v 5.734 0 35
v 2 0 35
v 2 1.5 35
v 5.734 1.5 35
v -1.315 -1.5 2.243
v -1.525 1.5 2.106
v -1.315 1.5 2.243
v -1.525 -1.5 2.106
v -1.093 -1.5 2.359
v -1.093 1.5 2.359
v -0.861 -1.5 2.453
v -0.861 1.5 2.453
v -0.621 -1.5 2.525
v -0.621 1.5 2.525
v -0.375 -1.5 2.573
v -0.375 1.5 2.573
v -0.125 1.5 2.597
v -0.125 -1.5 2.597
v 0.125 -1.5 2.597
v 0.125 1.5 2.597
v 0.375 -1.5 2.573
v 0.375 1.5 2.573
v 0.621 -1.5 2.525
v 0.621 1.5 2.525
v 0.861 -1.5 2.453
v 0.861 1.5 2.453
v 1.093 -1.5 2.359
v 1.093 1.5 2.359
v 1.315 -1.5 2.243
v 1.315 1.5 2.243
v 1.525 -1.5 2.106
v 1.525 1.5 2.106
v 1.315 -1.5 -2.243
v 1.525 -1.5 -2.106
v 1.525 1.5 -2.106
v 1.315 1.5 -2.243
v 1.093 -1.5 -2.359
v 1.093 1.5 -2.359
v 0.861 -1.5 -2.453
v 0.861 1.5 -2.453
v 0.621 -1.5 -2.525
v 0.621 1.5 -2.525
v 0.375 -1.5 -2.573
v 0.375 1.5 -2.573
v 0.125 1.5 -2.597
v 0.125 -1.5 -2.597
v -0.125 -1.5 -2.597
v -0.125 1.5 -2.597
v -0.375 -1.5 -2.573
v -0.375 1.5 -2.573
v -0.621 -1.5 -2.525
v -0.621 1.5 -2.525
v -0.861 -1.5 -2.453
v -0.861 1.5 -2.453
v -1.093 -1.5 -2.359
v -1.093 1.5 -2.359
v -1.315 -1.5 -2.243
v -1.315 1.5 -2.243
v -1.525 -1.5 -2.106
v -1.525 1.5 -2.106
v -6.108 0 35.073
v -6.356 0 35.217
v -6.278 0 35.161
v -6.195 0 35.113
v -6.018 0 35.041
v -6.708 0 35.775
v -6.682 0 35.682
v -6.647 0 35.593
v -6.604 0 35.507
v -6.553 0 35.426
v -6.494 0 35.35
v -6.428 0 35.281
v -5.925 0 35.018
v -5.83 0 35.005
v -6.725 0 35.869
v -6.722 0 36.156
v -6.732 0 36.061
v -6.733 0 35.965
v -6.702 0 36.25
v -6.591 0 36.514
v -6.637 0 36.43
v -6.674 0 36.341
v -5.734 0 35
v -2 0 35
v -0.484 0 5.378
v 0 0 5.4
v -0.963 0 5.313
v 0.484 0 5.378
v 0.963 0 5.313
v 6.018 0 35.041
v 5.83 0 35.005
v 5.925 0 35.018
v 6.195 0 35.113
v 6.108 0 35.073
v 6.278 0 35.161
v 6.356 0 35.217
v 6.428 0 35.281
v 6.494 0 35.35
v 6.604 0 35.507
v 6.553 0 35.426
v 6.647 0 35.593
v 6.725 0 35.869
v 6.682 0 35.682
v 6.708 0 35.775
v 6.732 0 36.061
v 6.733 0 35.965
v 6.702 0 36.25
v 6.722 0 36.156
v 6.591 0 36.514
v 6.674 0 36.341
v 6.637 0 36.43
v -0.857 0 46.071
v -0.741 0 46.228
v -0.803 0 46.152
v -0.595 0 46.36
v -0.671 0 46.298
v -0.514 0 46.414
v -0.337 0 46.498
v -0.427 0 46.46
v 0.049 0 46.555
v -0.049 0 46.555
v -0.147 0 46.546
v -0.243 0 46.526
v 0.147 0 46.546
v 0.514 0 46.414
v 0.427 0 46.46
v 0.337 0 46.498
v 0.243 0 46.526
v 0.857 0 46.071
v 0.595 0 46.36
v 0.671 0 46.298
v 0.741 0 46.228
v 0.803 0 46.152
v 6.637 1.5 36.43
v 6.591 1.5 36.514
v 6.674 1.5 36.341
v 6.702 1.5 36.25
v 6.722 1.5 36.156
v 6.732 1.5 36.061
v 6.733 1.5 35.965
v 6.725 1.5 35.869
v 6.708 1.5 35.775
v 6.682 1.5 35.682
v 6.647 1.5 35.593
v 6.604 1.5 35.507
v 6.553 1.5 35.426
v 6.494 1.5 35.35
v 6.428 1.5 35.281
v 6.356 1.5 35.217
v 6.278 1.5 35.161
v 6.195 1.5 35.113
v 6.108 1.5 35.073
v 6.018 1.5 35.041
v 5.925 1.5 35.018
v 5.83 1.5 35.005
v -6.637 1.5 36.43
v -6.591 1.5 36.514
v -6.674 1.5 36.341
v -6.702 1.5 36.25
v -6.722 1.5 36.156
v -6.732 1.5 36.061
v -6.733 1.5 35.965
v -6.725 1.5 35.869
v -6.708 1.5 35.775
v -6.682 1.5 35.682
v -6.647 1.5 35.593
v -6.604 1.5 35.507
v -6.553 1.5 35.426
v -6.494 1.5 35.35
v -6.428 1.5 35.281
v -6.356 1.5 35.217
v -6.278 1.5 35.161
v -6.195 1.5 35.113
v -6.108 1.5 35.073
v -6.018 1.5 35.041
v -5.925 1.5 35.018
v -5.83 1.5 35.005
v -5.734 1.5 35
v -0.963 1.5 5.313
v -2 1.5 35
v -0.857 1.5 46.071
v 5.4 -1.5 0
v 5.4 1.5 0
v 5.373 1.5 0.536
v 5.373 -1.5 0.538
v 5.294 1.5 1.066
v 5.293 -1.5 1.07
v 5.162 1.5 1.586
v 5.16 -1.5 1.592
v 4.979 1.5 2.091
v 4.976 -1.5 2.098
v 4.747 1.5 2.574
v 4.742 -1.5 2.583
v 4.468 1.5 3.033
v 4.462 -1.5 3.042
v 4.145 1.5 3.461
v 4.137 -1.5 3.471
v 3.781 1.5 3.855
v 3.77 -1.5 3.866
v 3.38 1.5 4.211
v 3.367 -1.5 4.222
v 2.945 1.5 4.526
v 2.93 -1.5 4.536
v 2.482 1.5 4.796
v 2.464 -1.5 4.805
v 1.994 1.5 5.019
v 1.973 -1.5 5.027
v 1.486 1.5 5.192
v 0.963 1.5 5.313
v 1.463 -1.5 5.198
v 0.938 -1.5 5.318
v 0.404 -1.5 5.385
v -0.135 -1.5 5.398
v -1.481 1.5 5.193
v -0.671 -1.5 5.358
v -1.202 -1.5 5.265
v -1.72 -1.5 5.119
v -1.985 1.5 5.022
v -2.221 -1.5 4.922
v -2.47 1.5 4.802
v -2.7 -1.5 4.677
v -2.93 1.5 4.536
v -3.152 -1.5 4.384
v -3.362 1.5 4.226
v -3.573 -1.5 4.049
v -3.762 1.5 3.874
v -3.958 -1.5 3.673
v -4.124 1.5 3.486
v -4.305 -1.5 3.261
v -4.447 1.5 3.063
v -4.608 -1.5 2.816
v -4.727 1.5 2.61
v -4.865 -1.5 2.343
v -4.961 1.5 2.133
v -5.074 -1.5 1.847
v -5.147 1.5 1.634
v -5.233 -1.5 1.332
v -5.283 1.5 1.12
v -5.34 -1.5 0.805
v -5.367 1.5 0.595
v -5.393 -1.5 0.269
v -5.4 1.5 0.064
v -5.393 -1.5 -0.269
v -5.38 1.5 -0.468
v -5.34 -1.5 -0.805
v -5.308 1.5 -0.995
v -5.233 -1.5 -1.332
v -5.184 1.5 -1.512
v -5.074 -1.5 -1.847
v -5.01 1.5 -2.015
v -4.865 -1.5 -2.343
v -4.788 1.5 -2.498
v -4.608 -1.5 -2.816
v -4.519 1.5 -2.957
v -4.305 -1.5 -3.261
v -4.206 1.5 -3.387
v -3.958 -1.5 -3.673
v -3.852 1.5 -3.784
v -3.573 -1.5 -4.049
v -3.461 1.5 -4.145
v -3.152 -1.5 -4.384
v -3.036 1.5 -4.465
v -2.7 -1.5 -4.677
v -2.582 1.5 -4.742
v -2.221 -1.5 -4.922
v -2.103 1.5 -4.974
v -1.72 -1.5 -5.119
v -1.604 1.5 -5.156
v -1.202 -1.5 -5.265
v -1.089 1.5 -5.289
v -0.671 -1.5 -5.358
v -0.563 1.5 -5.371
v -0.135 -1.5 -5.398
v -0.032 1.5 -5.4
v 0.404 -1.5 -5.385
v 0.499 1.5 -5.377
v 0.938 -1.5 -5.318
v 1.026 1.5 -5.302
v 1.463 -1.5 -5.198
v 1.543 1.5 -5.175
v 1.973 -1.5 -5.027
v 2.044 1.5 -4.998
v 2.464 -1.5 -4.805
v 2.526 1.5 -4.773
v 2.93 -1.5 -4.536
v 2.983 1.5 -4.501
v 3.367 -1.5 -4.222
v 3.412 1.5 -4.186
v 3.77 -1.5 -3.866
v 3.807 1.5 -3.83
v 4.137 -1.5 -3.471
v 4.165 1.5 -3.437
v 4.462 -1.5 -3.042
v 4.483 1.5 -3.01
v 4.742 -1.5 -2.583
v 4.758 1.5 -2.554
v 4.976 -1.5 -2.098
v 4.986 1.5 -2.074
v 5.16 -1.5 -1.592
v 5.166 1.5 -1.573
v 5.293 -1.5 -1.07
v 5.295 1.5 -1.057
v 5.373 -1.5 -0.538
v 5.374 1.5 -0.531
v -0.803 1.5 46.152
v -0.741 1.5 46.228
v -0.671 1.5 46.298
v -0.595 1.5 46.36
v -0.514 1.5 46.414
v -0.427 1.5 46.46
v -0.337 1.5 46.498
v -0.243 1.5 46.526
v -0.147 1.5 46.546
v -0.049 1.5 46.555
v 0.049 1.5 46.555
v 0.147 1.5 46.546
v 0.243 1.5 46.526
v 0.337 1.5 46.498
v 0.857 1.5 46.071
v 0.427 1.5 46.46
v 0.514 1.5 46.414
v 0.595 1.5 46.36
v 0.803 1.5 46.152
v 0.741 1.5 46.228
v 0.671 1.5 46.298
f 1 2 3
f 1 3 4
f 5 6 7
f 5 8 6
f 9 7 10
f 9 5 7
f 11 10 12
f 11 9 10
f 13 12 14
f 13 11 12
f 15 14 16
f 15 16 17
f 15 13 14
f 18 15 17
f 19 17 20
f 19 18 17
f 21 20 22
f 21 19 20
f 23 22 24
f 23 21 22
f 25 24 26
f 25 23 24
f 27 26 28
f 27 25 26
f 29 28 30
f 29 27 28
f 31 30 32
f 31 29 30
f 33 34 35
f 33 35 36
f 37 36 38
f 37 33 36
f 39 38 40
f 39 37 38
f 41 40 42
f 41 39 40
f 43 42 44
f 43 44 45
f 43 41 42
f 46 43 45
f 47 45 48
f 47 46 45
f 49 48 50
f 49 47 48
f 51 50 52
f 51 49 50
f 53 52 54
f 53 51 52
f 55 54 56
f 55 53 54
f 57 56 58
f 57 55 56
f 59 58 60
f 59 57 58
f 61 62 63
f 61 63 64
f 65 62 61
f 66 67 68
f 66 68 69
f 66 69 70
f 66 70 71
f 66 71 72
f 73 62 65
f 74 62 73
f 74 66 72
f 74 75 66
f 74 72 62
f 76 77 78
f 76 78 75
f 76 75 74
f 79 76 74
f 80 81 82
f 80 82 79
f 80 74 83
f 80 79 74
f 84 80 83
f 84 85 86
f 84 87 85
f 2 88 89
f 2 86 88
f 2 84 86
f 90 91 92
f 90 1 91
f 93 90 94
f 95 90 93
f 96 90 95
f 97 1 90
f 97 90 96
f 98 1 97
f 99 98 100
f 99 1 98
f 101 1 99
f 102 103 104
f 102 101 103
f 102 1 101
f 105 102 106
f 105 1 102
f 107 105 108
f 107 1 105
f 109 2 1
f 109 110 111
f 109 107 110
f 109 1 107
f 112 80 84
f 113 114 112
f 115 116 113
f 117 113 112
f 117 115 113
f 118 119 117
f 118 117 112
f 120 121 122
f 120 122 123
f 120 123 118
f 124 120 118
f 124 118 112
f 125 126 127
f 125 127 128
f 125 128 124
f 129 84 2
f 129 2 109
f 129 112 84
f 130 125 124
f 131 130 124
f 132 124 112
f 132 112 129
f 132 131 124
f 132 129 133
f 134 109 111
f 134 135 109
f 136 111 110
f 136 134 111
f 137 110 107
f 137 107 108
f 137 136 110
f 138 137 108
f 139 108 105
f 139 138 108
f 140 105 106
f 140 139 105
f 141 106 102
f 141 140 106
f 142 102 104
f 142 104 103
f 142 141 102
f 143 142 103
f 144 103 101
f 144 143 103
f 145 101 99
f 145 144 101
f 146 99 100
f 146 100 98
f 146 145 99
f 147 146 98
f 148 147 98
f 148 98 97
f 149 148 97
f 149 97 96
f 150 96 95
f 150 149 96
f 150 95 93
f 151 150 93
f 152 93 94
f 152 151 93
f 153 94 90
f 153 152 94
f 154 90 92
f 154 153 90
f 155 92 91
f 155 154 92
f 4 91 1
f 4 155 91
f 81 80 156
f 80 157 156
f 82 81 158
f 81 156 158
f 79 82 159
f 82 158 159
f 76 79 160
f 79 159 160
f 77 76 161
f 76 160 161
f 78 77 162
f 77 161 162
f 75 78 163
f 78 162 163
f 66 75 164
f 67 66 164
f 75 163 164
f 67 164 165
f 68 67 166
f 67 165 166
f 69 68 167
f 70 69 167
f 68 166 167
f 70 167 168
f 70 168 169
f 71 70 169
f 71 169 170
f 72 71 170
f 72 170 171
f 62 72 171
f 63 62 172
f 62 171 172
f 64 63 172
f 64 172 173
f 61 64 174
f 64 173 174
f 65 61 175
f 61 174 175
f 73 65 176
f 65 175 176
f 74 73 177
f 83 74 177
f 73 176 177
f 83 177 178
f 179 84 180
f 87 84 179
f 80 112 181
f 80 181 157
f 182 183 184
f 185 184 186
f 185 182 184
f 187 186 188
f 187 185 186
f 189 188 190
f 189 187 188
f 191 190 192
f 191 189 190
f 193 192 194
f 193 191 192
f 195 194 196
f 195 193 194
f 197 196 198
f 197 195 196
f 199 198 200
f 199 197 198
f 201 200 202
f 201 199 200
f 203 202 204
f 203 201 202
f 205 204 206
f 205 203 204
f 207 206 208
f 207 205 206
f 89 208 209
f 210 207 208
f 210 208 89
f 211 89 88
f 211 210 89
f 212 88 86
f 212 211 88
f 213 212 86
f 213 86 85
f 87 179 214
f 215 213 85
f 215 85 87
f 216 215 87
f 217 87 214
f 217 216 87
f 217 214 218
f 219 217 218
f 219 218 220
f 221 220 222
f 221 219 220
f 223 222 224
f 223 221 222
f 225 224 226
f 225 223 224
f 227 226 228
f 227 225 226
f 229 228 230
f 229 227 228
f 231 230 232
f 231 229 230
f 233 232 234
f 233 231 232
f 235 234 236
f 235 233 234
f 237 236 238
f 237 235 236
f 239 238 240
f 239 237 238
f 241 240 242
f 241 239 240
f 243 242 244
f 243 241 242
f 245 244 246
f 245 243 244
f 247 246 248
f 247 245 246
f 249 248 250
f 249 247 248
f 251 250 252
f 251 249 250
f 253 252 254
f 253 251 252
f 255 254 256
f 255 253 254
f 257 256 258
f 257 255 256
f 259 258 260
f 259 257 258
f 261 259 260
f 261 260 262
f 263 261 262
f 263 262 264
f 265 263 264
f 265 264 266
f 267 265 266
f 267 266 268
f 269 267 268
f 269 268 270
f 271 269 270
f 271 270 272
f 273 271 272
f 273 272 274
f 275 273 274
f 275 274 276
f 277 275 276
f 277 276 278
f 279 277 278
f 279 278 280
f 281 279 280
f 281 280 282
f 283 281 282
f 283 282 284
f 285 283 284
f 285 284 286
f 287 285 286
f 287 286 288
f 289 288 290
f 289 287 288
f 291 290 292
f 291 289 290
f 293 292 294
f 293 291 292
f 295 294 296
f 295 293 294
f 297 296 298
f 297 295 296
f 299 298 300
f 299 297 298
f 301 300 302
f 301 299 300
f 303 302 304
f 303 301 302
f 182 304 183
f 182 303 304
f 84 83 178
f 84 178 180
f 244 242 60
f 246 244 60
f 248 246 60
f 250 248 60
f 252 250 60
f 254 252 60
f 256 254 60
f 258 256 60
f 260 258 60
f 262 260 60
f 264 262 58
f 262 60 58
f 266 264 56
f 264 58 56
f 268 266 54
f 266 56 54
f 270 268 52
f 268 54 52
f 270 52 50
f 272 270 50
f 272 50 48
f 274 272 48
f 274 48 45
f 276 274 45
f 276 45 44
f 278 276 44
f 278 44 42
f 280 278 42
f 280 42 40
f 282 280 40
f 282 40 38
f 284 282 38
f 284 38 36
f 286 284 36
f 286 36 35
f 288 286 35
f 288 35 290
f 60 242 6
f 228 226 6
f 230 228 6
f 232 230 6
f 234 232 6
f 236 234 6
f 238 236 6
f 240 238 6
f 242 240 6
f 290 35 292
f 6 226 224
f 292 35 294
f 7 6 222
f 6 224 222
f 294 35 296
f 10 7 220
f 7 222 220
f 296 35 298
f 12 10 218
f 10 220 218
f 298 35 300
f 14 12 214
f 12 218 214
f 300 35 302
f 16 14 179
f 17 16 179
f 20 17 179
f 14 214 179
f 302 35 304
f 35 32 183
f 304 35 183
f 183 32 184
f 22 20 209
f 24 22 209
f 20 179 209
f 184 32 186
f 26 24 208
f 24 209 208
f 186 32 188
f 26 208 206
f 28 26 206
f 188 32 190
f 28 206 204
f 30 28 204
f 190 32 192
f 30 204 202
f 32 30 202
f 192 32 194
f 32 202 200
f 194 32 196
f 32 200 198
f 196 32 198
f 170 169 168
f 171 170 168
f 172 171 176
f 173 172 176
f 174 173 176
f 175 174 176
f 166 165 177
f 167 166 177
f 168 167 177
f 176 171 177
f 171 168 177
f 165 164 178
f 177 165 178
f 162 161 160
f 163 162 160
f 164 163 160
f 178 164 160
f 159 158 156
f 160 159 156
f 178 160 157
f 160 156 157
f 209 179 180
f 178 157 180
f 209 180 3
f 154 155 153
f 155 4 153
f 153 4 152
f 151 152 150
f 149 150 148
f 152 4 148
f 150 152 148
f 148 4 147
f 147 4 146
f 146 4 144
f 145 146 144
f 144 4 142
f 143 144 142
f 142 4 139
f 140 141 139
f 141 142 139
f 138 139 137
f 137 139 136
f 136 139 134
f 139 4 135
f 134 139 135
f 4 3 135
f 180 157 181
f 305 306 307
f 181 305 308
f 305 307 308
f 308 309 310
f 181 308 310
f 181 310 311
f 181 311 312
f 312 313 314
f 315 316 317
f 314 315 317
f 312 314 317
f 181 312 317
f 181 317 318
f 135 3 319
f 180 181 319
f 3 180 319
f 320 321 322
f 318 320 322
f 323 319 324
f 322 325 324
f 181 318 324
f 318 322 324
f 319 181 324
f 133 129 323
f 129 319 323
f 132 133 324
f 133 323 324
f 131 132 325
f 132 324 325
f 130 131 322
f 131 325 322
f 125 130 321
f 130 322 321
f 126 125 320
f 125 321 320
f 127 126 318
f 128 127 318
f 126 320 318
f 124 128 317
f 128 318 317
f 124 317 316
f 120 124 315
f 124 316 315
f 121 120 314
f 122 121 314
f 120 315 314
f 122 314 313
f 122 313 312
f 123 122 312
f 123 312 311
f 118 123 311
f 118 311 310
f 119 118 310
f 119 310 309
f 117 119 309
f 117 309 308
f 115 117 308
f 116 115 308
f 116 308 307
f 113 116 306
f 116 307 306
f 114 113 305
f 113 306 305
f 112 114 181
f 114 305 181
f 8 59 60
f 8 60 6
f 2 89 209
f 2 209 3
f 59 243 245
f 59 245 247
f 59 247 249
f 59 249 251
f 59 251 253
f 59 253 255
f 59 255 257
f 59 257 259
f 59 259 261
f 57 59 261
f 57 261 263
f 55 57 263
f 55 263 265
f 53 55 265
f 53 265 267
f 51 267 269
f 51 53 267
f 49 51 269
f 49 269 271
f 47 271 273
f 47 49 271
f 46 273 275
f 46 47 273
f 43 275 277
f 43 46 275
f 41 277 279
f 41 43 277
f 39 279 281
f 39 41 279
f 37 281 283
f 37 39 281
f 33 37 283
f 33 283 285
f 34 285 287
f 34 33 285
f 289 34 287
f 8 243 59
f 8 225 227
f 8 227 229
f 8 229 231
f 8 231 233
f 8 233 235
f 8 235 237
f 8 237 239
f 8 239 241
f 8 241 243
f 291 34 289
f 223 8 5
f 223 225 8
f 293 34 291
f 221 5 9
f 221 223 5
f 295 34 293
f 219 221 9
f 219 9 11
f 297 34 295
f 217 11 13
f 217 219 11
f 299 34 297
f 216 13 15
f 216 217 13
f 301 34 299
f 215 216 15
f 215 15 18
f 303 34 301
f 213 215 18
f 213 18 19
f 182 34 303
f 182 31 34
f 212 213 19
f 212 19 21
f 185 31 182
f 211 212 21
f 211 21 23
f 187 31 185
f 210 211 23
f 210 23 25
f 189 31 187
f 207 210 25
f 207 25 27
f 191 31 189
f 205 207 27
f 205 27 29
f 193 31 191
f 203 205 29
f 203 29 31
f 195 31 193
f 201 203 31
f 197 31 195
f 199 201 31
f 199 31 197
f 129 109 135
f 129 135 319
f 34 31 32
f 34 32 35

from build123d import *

# Parameters (mm, degrees)
F0_R     = 5.4
F1_DEPTH = 1.5
F3_DEPTH = 1.5
F5_DEPTH = 1.5
F6_R     = 1
F7_R     = 1
F8_R     = 1


with BuildPart() as f1:
    # F0 (on Front) → F1 (new body, symmetric)
    with BuildSketch(Plane.XZ):
        Circle(F0_R)
        with BuildLine():
            ThreePointArc((1.525, 2.1057955741), (2.3157072354, 1.1821590418), (2.6, 0))
            ThreePointArc((2.6, 0), (2.3157072354, -1.1821590418), (1.525, -2.1057955741))
            ThreePointArc((1.525, -2.1057955741), (0, -2.6), (-1.525, -2.1057955741))
            ThreePointArc((-1.525, -2.1057955741), (-2.6, 0), (-1.525, 2.1057955741))
            ThreePointArc((-1.525, 2.1057955741), (0, 2.6), (1.525, 2.1057955741))
        make_face(mode=Mode.SUBTRACT)
        with BuildLine():
            Line((-1.525, -2.1057955741), (-1.525, 2.1057955741))
            ThreePointArc((-1.525, 2.1057955741), (-2.6, 0), (-1.525, -2.1057955741))
        make_face()
        with BuildLine():
            ThreePointArc((1.525, -2.1057955741), (2.3157072354, -1.1821590418), (2.6, 0))
            ThreePointArc((2.6, 0), (2.3157072354, 1.1821590418), (1.525, 2.1057955741))
            Line((1.525, 2.1057955741), (1.525, -2.1057955741))
        make_face()
    extrude(amount=F1_DEPTH, both=True)

    # F2 (on Front) → F3 (join, through all)
    with BuildSketch(Plane.XZ):
        Polygon((-0.9291996635, 4.3362903498), (0, 4.3362903498), (0, 35), (-2, 35), align=None)
        Polygon((0, 35), (0, 4.3362903498), (0.9291996635, 4.3362903498), (2, 35), align=None)
    extrude(amount=-F3_DEPTH)

    # F4 (on Front) → F5 (join, through all)
    with BuildSketch(Plane.XZ):
        Polygon((0, 35), (0, 47.5), (-7.5, 35), align=None)
        Polygon((7.5, 35), (0, 47.5), (0, 35), align=None)
    extrude(amount=-F5_DEPTH)

    # F6
    f6_edges = [f1.edges().sort_by_distance(p)[0] for p in [
        (7.5, 0.75, 35),
    ]]
    fillet(f6_edges, radius=F6_R)

    # F7
    f7_edges = [f1.edges().sort_by_distance(p)[0] for p in [
        (0, 0.75, 47.5),
    ]]
    fillet(f7_edges, radius=F7_R)

    # F8
    f8_edges = [f1.edges().sort_by_distance(p)[0] for p in [
        (-7.5, 0.75, 35),
    ]]
    fillet(f8_edges, radius=F8_R)


solid = f1.part
